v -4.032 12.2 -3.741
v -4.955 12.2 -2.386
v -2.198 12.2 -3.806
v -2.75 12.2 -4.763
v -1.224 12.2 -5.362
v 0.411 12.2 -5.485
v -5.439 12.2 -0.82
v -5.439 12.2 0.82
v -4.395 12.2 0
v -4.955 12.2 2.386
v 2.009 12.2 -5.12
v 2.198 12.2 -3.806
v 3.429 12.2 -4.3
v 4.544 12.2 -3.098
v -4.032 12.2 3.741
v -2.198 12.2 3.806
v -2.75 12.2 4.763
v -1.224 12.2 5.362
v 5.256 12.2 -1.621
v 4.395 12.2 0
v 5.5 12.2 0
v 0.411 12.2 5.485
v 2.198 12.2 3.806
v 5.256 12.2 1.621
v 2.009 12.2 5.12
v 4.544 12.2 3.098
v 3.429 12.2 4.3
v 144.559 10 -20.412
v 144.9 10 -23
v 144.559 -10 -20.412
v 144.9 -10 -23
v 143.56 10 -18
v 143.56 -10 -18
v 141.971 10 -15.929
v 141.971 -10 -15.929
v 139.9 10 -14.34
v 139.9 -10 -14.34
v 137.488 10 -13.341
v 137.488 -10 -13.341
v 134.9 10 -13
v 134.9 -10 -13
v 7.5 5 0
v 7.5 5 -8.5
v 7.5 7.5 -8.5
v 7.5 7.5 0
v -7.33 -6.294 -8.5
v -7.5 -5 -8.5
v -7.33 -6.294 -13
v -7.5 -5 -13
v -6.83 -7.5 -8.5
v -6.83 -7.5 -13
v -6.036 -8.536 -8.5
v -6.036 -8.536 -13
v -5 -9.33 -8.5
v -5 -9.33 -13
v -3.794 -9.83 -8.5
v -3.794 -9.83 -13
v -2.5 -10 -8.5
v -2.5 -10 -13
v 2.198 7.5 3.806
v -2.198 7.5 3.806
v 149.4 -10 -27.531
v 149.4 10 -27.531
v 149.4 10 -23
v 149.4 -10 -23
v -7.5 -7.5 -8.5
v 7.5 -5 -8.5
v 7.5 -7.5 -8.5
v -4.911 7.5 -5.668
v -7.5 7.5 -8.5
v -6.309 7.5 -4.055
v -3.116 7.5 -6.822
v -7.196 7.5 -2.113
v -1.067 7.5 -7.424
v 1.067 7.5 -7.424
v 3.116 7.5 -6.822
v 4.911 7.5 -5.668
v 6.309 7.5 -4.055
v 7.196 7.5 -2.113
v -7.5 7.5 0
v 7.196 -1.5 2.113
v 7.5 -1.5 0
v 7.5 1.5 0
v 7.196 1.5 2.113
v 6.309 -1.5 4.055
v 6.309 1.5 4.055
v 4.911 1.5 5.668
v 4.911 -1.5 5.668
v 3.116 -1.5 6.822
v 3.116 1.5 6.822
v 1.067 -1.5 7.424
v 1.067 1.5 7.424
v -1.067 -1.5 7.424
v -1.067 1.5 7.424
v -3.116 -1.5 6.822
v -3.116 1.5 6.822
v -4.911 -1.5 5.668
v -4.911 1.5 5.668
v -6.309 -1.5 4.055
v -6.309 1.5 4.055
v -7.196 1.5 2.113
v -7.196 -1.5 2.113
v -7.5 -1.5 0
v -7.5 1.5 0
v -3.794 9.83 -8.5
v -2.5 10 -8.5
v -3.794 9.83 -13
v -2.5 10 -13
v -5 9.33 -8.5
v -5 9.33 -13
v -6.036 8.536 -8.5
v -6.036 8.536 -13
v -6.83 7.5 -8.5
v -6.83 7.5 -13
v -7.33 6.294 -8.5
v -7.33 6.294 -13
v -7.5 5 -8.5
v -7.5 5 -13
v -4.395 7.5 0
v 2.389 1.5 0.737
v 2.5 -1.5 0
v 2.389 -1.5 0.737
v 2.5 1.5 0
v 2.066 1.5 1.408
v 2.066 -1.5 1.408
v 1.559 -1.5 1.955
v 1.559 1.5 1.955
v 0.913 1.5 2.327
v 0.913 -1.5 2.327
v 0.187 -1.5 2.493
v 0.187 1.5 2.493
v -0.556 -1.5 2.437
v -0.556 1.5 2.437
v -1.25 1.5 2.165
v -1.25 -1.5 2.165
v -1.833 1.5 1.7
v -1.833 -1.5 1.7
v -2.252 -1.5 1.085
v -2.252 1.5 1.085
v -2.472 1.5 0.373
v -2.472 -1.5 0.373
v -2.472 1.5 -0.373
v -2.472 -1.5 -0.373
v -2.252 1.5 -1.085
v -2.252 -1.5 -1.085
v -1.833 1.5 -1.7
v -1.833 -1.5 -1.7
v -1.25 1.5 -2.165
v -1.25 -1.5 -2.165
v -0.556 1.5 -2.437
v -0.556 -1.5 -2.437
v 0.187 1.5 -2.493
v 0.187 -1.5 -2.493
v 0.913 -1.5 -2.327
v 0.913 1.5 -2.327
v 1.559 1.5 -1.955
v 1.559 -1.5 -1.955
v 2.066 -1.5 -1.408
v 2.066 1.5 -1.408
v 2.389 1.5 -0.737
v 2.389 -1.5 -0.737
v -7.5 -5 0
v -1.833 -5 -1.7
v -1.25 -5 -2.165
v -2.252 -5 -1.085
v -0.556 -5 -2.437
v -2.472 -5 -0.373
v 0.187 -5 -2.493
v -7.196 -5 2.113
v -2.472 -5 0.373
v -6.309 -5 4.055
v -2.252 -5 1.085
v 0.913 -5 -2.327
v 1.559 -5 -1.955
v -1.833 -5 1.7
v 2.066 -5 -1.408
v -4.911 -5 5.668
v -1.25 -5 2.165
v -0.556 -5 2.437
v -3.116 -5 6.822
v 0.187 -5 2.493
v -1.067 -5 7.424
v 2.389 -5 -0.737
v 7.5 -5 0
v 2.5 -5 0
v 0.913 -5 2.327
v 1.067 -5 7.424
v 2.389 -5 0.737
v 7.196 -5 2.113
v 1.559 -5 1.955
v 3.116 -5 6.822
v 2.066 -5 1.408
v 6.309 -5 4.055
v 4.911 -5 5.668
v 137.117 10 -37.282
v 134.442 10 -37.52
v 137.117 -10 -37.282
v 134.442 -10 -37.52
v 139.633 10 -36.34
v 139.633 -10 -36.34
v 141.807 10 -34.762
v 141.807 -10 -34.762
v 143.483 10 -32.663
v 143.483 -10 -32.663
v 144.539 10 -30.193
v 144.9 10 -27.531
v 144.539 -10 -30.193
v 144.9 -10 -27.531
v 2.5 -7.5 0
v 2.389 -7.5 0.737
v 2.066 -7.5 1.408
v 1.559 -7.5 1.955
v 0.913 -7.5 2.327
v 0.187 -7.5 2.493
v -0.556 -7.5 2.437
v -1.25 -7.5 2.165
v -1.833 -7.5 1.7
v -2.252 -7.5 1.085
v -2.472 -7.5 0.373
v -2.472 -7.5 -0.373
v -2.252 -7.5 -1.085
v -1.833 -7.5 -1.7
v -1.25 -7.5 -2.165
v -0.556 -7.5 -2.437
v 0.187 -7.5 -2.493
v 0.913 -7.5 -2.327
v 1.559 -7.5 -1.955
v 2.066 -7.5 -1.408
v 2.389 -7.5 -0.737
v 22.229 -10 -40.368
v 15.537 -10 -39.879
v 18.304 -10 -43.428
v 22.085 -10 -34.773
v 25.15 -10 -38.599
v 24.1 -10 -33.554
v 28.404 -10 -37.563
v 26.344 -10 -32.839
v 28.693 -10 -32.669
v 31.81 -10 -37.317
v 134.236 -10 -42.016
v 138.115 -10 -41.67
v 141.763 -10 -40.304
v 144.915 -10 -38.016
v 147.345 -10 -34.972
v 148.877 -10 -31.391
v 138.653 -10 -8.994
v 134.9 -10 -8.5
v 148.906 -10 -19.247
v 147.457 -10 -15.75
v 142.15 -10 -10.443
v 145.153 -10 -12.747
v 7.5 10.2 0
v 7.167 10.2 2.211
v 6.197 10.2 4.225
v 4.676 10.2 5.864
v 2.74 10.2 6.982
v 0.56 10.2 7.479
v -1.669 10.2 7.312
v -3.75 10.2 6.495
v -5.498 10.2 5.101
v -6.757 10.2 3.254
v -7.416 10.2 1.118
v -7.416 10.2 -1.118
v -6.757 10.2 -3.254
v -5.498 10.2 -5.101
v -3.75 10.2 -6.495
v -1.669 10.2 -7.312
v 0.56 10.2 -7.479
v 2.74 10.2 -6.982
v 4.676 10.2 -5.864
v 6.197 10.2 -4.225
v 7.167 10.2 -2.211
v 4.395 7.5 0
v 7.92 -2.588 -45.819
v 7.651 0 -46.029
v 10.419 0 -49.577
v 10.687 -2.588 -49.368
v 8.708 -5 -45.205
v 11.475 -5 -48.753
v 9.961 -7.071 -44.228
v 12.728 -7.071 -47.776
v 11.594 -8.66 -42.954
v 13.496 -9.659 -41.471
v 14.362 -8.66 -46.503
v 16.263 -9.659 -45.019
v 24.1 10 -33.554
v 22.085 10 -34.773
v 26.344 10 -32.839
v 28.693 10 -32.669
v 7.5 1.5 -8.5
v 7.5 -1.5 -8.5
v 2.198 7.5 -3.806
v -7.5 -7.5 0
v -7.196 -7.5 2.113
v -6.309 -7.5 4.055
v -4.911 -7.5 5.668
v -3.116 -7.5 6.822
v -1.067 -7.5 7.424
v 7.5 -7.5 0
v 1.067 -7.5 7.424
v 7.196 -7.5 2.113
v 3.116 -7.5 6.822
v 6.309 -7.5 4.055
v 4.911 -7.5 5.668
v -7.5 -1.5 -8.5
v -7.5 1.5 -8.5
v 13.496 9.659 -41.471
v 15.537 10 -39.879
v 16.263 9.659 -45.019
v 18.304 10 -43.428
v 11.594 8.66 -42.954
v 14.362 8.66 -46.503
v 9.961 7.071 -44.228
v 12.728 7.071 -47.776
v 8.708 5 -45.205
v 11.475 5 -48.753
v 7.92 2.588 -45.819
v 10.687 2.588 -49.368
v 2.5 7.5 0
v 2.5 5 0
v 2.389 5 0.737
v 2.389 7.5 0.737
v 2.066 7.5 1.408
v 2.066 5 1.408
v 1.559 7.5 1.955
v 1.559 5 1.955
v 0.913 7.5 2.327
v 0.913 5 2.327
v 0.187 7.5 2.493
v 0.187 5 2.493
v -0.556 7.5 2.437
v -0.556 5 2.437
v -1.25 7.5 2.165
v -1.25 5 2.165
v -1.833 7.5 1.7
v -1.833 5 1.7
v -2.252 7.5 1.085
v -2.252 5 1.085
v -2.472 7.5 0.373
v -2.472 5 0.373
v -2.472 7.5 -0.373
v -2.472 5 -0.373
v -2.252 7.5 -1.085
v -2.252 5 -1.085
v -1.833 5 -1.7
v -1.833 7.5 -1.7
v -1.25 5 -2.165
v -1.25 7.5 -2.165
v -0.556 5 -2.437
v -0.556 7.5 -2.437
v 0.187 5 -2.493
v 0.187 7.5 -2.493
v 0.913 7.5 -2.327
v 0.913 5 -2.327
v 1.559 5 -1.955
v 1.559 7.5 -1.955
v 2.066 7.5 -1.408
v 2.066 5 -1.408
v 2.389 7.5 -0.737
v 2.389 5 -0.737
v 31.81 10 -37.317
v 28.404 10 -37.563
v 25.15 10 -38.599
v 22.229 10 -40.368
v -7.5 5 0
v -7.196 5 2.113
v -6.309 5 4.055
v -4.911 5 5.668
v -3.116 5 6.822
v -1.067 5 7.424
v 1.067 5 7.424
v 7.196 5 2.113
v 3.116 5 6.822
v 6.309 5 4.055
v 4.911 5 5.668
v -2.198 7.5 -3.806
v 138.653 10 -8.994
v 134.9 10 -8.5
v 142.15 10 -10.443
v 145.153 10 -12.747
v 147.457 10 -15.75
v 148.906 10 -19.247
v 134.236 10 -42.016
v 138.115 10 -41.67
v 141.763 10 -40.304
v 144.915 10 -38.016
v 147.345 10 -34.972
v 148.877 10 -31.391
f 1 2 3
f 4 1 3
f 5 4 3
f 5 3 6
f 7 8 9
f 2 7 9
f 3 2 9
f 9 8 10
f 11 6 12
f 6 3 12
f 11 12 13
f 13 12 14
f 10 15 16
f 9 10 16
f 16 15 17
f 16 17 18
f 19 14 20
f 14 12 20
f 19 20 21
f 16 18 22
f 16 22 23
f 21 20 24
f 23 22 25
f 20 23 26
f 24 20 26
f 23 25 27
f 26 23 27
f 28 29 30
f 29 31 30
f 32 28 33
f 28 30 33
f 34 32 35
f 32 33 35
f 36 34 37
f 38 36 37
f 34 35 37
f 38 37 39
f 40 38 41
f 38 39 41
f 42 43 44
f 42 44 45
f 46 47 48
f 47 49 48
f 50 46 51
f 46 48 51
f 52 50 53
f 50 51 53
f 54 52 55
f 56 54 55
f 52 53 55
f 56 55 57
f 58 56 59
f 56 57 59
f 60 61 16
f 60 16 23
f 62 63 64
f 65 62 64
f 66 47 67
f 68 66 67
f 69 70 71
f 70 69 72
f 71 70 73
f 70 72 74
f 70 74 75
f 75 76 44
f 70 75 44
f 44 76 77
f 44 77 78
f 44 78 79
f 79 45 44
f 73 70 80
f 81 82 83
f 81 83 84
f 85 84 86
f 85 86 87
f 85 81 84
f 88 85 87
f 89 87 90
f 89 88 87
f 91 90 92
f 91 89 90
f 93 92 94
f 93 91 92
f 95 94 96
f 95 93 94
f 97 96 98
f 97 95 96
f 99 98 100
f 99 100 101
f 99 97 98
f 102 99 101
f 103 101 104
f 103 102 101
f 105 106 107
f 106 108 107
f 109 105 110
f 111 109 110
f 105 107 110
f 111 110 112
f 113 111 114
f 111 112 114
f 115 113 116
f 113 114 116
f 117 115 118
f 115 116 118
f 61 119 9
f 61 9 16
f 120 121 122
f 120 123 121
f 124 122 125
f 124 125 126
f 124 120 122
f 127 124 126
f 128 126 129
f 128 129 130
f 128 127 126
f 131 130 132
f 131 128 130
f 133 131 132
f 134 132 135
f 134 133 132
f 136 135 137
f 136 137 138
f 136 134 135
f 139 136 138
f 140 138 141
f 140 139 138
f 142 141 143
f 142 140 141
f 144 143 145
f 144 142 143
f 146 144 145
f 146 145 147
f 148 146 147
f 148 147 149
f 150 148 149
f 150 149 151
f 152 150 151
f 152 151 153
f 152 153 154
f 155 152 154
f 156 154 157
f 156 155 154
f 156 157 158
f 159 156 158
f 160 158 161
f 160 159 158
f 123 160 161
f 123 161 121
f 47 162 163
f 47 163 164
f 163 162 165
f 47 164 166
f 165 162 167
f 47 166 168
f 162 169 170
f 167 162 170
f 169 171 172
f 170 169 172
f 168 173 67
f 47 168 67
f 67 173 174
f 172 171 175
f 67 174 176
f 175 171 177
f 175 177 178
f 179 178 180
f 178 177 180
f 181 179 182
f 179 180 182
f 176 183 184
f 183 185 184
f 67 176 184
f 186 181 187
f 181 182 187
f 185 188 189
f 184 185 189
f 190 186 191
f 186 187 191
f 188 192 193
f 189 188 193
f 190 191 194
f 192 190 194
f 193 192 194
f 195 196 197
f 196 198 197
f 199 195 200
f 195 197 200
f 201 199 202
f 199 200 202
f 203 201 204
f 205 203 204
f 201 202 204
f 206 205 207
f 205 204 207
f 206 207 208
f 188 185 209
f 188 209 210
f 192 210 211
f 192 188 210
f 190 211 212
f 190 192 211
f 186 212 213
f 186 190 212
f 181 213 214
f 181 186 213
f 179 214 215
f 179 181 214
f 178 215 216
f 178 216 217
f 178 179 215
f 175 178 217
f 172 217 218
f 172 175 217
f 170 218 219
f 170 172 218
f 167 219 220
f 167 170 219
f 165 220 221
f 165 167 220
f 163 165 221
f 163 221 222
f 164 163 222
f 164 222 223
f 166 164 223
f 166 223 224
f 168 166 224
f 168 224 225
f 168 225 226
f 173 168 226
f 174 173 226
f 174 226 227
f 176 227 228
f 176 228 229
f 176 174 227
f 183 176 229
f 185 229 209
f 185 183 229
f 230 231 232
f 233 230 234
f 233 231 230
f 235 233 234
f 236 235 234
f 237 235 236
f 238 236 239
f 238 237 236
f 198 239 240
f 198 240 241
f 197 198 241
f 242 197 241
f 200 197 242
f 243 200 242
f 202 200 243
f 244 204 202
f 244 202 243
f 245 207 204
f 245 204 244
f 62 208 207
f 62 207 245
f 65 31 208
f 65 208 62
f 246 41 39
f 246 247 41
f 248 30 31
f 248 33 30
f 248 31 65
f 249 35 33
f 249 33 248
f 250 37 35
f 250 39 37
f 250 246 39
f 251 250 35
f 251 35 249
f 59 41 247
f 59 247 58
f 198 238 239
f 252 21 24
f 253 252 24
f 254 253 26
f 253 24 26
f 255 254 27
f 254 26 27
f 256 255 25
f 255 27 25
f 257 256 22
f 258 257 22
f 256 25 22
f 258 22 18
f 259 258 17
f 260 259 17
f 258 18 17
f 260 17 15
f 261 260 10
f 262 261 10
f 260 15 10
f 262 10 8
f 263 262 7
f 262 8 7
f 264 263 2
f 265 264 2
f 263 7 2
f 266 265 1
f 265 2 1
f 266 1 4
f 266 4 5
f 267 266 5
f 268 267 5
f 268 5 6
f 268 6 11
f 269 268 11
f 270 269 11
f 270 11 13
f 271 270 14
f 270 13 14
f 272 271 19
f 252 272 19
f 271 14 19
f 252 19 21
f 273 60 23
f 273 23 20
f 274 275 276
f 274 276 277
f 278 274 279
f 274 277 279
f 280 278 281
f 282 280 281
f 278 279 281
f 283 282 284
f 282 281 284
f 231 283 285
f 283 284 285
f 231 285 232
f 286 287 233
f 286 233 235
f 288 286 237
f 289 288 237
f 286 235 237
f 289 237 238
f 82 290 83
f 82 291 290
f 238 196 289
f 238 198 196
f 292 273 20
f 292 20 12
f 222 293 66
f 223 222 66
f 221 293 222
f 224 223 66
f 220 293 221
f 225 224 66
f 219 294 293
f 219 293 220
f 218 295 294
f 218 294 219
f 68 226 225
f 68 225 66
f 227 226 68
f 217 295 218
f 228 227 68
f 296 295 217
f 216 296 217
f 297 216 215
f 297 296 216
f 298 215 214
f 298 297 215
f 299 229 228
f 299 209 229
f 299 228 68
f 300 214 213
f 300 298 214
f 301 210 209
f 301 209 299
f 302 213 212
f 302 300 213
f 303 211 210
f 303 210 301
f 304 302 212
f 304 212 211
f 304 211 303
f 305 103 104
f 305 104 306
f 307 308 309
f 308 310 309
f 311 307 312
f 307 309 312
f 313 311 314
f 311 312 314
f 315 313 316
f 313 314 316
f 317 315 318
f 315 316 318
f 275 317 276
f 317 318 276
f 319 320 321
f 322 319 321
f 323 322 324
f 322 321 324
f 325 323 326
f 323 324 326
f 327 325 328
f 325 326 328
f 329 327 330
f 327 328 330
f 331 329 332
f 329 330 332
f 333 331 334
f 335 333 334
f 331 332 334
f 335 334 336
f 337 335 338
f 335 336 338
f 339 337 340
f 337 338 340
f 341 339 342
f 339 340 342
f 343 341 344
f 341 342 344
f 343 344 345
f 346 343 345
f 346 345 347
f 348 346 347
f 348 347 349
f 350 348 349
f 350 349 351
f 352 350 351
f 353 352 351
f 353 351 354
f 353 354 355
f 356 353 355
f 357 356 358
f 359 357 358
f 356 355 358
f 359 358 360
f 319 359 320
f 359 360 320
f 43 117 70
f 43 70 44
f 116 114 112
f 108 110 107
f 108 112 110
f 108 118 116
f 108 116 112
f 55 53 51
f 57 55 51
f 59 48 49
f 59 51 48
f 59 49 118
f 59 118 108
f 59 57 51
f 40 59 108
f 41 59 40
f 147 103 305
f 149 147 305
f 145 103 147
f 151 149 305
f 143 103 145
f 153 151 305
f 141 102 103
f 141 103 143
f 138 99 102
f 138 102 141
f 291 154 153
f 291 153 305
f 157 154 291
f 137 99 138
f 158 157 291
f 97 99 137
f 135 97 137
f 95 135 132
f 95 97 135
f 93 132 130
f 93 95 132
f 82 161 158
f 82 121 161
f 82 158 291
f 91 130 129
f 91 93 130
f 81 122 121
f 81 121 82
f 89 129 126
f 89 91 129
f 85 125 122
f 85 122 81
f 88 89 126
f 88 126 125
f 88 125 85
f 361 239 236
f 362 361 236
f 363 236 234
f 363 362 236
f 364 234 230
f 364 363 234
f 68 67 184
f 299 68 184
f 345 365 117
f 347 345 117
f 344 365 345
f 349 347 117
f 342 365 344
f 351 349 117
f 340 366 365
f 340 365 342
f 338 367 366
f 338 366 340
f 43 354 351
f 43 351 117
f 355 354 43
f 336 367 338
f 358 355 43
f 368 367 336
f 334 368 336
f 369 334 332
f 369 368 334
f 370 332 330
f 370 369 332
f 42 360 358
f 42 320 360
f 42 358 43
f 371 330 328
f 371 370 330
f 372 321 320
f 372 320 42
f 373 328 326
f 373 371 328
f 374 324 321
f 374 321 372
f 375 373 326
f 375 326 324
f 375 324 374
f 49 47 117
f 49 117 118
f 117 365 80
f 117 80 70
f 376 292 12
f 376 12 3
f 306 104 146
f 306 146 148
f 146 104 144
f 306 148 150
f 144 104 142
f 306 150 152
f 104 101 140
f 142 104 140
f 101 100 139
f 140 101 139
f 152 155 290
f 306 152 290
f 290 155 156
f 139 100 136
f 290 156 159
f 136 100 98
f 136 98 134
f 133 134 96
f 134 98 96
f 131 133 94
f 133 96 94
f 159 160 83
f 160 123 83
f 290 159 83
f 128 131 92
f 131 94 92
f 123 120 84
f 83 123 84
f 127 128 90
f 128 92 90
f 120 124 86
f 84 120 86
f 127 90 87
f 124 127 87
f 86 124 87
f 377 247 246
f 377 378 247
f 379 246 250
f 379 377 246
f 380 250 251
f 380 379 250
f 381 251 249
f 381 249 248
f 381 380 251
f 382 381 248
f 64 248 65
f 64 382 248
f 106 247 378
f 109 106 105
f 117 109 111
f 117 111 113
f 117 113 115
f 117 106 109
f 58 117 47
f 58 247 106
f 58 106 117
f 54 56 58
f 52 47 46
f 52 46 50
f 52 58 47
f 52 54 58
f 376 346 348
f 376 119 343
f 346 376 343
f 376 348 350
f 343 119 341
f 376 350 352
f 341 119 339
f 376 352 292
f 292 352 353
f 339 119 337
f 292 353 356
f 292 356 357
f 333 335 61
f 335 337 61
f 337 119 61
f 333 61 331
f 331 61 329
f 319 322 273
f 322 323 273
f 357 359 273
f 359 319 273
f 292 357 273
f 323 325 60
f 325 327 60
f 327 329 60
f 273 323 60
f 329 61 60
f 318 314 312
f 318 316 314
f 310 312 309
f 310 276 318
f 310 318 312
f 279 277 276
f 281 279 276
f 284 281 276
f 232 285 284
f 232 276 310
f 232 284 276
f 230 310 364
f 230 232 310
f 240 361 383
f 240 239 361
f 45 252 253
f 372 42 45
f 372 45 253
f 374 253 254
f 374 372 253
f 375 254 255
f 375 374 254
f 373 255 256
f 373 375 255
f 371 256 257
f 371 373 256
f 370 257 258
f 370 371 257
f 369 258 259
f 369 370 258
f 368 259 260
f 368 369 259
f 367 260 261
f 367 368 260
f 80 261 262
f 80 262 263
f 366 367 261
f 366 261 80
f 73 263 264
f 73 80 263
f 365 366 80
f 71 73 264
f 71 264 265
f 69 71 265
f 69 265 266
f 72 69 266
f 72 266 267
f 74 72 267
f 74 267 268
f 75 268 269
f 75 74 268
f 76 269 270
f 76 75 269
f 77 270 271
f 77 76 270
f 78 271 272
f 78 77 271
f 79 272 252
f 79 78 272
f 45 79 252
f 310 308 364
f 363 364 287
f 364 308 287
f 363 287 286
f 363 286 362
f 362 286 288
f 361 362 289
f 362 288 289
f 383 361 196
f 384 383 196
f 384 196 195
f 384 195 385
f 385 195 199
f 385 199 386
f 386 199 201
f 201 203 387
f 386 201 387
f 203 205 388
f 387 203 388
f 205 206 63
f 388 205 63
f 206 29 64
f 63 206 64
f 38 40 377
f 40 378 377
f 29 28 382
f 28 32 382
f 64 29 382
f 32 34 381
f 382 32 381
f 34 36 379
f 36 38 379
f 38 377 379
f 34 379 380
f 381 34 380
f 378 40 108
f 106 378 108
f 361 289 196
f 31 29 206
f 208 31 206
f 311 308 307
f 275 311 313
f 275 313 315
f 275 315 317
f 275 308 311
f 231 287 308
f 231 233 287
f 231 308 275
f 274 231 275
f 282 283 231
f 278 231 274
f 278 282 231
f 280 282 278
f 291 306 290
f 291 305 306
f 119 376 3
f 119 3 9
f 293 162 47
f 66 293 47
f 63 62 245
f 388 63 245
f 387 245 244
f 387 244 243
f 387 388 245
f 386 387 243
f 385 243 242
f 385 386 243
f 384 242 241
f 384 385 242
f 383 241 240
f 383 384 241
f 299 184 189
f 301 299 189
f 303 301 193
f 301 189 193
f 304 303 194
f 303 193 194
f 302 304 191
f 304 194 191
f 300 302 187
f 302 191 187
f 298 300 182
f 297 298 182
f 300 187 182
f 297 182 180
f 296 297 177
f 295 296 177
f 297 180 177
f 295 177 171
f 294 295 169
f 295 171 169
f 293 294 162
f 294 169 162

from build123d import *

# Parameters (mm, degrees)
F0_R     = 2.5
F1_DEPTH = 1.5
F2_START = 5
F2_DEPTH = 2.5
F3_START = -5
F3_DEPTH = 2.5
F4_START = -7.5
F4_DEPTH = 4.7
F5_SIZE  = 2
F7_DEPTH = 10
F8_R     = 10
F9_R     = 14.5
F10_R    = 9.99999
F11_R    = 5


# Not quite as in the source:
# - a fillet or chamfer is up to 0.001 mm smaller than in the source, because OpenCascade refuses the exact size


with BuildPart() as f1:
    # F0 (on Front) → F1 (new body, symmetric)
    with BuildSketch(Plane.XZ):
        with BuildLine():
            Line((7.5, -8.5), (7.5, 0))
            ThreePointArc((7.5, 0), (0, -7.5), (-7.5, 0))
            Line((-7.5, 0), (-7.5, -8.5))
            Line((-7.5, -8.5), (7.5, -8.5))
        make_face()
        with BuildLine():
            ThreePointArc((-7.5, 0), (0, -7.5), (7.5, 0))
            ThreePointArc((7.5, 0), (0, 7.5), (-7.5, 0))
        make_face()
        Polygon((2.1975, 3.8061816496), (4.395, 0), (2.1975, -3.8061816496), (-2.1975, -3.8061816496), (-4.395, 0), (-2.1975, 3.8061816496), align=None, mode=Mode.SUBTRACT)
        Polygon((2.1975, -3.8061816496), (4.395, 0), (2.1975, 3.8061816496), (-2.1975, 3.8061816496), (-4.395, 0), (-2.1975, -3.8061816496), align=None)
        Circle(F0_R, mode=Mode.SUBTRACT)
    extrude(amount=F1_DEPTH, both=True)


with BuildPart() as f2:
    # F0 (on Front) → F2 (new body)
    with BuildSketch(Plane.XZ.offset(F2_START)):
        with BuildLine():
            Line((7.5, -8.5), (7.5, 0))
            ThreePointArc((7.5, 0), (0, -7.5), (-7.5, 0))
            Line((-7.5, 0), (-7.5, -8.5))
            Line((-7.5, -8.5), (7.5, -8.5))
        make_face()
        with BuildLine():
            ThreePointArc((-7.5, 0), (0, -7.5), (7.5, 0))
            ThreePointArc((7.5, 0), (0, 7.5), (-7.5, 0))
        make_face()
        Polygon((2.1975, 3.8061816496), (4.395, 0), (2.1975, -3.8061816496), (-2.1975, -3.8061816496), (-4.395, 0), (-2.1975, 3.8061816496), align=None, mode=Mode.SUBTRACT)
        Polygon((2.1975, -3.8061816496), (4.395, 0), (2.1975, 3.8061816496), (-2.1975, 3.8061816496), (-4.395, 0), (-2.1975, -3.8061816496), align=None)
        Circle(F0_R, mode=Mode.SUBTRACT)
    extrude(amount=F2_DEPTH)


with BuildPart() as f3:
    # F0 (on Front) → F3 (new body)
    with BuildSketch(Plane.XZ.offset(F3_START)):
        with BuildLine():
            ThreePointArc((-7.5, 0), (0, -7.5), (7.5, 0))
            ThreePointArc((7.5, 0), (0, 7.5), (-7.5, 0))
        make_face()
        Polygon((2.1975, 3.8061816496), (4.395, 0), (2.1975, -3.8061816496), (-2.1975, -3.8061816496), (-4.395, 0), (-2.1975, 3.8061816496), align=None, mode=Mode.SUBTRACT)
        with BuildLine():
            Line((7.5, -8.5), (7.5, 0))
            ThreePointArc((7.5, 0), (0, -7.5), (-7.5, 0))
            Line((-7.5, 0), (-7.5, -8.5))
            Line((-7.5, -8.5), (7.5, -8.5))
        make_face()
        Polygon((2.1975, -3.8061816496), (4.395, 0), (2.1975, 3.8061816496), (-2.1975, 3.8061816496), (-4.395, 0), (-2.1975, -3.8061816496), align=None)
        Circle(F0_R, mode=Mode.SUBTRACT)
    extrude(amount=-F3_DEPTH)

    # F0 (on Front) → F4 (join)
    with BuildSketch(Plane.XZ.offset(F4_START)):
        with BuildLine():
            ThreePointArc((-7.5, 0), (0, -7.5), (7.5, 0))
            ThreePointArc((7.5, 0), (0, 7.5), (-7.5, 0))
        make_face()
        Polygon((2.1975, 3.8061816496), (4.395, 0), (2.1975, -3.8061816496), (-2.1975, -3.8061816496), (-4.395, 0), (-2.1975, 3.8061816496), align=None, mode=Mode.SUBTRACT)
    extrude(amount=-F4_DEPTH)

    # F5
    f5_edges = [f3.edges().sort_by_distance(p)[0] for p in [
        (-7.5, 12.2, 0),
    ]]
    chamfer(f5_edges, length=F5_SIZE)


with BuildPart() as f7:
    # F6 (on Front) → F7 (new body, symmetric)
    with BuildSketch(Plane.XZ):
        Polygon((149.4, -8.5), (-7.5, -8.5), (-7.5, -13), (144.9, -13), (144.9, -38), (25, -32.5), (7.6514315894, -46.028753605), (10.418676645, -49.5773244162), (26.4554967217, -37.0714978667), (149.4, -42.7111539804), align=None)
    extrude(amount=F7_DEPTH, both=True)

    # F8
    f8_edges = [f7.edges().sort_by_distance(p)[0] for p in [
        (25, 0, -32.5),
        (144.9, 0, -38),
        (144.9, 0, -13),
    ]]
    fillet(f8_edges, radius=F8_R)

    # F9
    f9_edges = [f7.edges().sort_by_distance(p)[0] for p in [
        (149.4, 0, -42.711154),
        (149.4, 0, -8.5),
        (26.455497, 0, -37.071498),
    ]]
    fillet(f9_edges, radius=F9_R)

    # F10 (radius 10 in the source; OpenCascade refuses exactly that, so slightly less here)
    f10_edges = [f7.edges().sort_by_distance(p)[0] for p in [
        (9.035054, 10, -47.803039),
        (9.035054, -10, -47.803039),
    ]]
    fillet(f10_edges, radius=F10_R)

    # F11
    f11_edges = [f7.edges().sort_by_distance(p)[0] for p in [
        (-7.5, -10, -10.75),
        (-7.5, 10, -10.75),
    ]]
    fillet(f11_edges, radius=F11_R)


solid = Compound([f1.part, f2.part, f3.part, f7.part])
